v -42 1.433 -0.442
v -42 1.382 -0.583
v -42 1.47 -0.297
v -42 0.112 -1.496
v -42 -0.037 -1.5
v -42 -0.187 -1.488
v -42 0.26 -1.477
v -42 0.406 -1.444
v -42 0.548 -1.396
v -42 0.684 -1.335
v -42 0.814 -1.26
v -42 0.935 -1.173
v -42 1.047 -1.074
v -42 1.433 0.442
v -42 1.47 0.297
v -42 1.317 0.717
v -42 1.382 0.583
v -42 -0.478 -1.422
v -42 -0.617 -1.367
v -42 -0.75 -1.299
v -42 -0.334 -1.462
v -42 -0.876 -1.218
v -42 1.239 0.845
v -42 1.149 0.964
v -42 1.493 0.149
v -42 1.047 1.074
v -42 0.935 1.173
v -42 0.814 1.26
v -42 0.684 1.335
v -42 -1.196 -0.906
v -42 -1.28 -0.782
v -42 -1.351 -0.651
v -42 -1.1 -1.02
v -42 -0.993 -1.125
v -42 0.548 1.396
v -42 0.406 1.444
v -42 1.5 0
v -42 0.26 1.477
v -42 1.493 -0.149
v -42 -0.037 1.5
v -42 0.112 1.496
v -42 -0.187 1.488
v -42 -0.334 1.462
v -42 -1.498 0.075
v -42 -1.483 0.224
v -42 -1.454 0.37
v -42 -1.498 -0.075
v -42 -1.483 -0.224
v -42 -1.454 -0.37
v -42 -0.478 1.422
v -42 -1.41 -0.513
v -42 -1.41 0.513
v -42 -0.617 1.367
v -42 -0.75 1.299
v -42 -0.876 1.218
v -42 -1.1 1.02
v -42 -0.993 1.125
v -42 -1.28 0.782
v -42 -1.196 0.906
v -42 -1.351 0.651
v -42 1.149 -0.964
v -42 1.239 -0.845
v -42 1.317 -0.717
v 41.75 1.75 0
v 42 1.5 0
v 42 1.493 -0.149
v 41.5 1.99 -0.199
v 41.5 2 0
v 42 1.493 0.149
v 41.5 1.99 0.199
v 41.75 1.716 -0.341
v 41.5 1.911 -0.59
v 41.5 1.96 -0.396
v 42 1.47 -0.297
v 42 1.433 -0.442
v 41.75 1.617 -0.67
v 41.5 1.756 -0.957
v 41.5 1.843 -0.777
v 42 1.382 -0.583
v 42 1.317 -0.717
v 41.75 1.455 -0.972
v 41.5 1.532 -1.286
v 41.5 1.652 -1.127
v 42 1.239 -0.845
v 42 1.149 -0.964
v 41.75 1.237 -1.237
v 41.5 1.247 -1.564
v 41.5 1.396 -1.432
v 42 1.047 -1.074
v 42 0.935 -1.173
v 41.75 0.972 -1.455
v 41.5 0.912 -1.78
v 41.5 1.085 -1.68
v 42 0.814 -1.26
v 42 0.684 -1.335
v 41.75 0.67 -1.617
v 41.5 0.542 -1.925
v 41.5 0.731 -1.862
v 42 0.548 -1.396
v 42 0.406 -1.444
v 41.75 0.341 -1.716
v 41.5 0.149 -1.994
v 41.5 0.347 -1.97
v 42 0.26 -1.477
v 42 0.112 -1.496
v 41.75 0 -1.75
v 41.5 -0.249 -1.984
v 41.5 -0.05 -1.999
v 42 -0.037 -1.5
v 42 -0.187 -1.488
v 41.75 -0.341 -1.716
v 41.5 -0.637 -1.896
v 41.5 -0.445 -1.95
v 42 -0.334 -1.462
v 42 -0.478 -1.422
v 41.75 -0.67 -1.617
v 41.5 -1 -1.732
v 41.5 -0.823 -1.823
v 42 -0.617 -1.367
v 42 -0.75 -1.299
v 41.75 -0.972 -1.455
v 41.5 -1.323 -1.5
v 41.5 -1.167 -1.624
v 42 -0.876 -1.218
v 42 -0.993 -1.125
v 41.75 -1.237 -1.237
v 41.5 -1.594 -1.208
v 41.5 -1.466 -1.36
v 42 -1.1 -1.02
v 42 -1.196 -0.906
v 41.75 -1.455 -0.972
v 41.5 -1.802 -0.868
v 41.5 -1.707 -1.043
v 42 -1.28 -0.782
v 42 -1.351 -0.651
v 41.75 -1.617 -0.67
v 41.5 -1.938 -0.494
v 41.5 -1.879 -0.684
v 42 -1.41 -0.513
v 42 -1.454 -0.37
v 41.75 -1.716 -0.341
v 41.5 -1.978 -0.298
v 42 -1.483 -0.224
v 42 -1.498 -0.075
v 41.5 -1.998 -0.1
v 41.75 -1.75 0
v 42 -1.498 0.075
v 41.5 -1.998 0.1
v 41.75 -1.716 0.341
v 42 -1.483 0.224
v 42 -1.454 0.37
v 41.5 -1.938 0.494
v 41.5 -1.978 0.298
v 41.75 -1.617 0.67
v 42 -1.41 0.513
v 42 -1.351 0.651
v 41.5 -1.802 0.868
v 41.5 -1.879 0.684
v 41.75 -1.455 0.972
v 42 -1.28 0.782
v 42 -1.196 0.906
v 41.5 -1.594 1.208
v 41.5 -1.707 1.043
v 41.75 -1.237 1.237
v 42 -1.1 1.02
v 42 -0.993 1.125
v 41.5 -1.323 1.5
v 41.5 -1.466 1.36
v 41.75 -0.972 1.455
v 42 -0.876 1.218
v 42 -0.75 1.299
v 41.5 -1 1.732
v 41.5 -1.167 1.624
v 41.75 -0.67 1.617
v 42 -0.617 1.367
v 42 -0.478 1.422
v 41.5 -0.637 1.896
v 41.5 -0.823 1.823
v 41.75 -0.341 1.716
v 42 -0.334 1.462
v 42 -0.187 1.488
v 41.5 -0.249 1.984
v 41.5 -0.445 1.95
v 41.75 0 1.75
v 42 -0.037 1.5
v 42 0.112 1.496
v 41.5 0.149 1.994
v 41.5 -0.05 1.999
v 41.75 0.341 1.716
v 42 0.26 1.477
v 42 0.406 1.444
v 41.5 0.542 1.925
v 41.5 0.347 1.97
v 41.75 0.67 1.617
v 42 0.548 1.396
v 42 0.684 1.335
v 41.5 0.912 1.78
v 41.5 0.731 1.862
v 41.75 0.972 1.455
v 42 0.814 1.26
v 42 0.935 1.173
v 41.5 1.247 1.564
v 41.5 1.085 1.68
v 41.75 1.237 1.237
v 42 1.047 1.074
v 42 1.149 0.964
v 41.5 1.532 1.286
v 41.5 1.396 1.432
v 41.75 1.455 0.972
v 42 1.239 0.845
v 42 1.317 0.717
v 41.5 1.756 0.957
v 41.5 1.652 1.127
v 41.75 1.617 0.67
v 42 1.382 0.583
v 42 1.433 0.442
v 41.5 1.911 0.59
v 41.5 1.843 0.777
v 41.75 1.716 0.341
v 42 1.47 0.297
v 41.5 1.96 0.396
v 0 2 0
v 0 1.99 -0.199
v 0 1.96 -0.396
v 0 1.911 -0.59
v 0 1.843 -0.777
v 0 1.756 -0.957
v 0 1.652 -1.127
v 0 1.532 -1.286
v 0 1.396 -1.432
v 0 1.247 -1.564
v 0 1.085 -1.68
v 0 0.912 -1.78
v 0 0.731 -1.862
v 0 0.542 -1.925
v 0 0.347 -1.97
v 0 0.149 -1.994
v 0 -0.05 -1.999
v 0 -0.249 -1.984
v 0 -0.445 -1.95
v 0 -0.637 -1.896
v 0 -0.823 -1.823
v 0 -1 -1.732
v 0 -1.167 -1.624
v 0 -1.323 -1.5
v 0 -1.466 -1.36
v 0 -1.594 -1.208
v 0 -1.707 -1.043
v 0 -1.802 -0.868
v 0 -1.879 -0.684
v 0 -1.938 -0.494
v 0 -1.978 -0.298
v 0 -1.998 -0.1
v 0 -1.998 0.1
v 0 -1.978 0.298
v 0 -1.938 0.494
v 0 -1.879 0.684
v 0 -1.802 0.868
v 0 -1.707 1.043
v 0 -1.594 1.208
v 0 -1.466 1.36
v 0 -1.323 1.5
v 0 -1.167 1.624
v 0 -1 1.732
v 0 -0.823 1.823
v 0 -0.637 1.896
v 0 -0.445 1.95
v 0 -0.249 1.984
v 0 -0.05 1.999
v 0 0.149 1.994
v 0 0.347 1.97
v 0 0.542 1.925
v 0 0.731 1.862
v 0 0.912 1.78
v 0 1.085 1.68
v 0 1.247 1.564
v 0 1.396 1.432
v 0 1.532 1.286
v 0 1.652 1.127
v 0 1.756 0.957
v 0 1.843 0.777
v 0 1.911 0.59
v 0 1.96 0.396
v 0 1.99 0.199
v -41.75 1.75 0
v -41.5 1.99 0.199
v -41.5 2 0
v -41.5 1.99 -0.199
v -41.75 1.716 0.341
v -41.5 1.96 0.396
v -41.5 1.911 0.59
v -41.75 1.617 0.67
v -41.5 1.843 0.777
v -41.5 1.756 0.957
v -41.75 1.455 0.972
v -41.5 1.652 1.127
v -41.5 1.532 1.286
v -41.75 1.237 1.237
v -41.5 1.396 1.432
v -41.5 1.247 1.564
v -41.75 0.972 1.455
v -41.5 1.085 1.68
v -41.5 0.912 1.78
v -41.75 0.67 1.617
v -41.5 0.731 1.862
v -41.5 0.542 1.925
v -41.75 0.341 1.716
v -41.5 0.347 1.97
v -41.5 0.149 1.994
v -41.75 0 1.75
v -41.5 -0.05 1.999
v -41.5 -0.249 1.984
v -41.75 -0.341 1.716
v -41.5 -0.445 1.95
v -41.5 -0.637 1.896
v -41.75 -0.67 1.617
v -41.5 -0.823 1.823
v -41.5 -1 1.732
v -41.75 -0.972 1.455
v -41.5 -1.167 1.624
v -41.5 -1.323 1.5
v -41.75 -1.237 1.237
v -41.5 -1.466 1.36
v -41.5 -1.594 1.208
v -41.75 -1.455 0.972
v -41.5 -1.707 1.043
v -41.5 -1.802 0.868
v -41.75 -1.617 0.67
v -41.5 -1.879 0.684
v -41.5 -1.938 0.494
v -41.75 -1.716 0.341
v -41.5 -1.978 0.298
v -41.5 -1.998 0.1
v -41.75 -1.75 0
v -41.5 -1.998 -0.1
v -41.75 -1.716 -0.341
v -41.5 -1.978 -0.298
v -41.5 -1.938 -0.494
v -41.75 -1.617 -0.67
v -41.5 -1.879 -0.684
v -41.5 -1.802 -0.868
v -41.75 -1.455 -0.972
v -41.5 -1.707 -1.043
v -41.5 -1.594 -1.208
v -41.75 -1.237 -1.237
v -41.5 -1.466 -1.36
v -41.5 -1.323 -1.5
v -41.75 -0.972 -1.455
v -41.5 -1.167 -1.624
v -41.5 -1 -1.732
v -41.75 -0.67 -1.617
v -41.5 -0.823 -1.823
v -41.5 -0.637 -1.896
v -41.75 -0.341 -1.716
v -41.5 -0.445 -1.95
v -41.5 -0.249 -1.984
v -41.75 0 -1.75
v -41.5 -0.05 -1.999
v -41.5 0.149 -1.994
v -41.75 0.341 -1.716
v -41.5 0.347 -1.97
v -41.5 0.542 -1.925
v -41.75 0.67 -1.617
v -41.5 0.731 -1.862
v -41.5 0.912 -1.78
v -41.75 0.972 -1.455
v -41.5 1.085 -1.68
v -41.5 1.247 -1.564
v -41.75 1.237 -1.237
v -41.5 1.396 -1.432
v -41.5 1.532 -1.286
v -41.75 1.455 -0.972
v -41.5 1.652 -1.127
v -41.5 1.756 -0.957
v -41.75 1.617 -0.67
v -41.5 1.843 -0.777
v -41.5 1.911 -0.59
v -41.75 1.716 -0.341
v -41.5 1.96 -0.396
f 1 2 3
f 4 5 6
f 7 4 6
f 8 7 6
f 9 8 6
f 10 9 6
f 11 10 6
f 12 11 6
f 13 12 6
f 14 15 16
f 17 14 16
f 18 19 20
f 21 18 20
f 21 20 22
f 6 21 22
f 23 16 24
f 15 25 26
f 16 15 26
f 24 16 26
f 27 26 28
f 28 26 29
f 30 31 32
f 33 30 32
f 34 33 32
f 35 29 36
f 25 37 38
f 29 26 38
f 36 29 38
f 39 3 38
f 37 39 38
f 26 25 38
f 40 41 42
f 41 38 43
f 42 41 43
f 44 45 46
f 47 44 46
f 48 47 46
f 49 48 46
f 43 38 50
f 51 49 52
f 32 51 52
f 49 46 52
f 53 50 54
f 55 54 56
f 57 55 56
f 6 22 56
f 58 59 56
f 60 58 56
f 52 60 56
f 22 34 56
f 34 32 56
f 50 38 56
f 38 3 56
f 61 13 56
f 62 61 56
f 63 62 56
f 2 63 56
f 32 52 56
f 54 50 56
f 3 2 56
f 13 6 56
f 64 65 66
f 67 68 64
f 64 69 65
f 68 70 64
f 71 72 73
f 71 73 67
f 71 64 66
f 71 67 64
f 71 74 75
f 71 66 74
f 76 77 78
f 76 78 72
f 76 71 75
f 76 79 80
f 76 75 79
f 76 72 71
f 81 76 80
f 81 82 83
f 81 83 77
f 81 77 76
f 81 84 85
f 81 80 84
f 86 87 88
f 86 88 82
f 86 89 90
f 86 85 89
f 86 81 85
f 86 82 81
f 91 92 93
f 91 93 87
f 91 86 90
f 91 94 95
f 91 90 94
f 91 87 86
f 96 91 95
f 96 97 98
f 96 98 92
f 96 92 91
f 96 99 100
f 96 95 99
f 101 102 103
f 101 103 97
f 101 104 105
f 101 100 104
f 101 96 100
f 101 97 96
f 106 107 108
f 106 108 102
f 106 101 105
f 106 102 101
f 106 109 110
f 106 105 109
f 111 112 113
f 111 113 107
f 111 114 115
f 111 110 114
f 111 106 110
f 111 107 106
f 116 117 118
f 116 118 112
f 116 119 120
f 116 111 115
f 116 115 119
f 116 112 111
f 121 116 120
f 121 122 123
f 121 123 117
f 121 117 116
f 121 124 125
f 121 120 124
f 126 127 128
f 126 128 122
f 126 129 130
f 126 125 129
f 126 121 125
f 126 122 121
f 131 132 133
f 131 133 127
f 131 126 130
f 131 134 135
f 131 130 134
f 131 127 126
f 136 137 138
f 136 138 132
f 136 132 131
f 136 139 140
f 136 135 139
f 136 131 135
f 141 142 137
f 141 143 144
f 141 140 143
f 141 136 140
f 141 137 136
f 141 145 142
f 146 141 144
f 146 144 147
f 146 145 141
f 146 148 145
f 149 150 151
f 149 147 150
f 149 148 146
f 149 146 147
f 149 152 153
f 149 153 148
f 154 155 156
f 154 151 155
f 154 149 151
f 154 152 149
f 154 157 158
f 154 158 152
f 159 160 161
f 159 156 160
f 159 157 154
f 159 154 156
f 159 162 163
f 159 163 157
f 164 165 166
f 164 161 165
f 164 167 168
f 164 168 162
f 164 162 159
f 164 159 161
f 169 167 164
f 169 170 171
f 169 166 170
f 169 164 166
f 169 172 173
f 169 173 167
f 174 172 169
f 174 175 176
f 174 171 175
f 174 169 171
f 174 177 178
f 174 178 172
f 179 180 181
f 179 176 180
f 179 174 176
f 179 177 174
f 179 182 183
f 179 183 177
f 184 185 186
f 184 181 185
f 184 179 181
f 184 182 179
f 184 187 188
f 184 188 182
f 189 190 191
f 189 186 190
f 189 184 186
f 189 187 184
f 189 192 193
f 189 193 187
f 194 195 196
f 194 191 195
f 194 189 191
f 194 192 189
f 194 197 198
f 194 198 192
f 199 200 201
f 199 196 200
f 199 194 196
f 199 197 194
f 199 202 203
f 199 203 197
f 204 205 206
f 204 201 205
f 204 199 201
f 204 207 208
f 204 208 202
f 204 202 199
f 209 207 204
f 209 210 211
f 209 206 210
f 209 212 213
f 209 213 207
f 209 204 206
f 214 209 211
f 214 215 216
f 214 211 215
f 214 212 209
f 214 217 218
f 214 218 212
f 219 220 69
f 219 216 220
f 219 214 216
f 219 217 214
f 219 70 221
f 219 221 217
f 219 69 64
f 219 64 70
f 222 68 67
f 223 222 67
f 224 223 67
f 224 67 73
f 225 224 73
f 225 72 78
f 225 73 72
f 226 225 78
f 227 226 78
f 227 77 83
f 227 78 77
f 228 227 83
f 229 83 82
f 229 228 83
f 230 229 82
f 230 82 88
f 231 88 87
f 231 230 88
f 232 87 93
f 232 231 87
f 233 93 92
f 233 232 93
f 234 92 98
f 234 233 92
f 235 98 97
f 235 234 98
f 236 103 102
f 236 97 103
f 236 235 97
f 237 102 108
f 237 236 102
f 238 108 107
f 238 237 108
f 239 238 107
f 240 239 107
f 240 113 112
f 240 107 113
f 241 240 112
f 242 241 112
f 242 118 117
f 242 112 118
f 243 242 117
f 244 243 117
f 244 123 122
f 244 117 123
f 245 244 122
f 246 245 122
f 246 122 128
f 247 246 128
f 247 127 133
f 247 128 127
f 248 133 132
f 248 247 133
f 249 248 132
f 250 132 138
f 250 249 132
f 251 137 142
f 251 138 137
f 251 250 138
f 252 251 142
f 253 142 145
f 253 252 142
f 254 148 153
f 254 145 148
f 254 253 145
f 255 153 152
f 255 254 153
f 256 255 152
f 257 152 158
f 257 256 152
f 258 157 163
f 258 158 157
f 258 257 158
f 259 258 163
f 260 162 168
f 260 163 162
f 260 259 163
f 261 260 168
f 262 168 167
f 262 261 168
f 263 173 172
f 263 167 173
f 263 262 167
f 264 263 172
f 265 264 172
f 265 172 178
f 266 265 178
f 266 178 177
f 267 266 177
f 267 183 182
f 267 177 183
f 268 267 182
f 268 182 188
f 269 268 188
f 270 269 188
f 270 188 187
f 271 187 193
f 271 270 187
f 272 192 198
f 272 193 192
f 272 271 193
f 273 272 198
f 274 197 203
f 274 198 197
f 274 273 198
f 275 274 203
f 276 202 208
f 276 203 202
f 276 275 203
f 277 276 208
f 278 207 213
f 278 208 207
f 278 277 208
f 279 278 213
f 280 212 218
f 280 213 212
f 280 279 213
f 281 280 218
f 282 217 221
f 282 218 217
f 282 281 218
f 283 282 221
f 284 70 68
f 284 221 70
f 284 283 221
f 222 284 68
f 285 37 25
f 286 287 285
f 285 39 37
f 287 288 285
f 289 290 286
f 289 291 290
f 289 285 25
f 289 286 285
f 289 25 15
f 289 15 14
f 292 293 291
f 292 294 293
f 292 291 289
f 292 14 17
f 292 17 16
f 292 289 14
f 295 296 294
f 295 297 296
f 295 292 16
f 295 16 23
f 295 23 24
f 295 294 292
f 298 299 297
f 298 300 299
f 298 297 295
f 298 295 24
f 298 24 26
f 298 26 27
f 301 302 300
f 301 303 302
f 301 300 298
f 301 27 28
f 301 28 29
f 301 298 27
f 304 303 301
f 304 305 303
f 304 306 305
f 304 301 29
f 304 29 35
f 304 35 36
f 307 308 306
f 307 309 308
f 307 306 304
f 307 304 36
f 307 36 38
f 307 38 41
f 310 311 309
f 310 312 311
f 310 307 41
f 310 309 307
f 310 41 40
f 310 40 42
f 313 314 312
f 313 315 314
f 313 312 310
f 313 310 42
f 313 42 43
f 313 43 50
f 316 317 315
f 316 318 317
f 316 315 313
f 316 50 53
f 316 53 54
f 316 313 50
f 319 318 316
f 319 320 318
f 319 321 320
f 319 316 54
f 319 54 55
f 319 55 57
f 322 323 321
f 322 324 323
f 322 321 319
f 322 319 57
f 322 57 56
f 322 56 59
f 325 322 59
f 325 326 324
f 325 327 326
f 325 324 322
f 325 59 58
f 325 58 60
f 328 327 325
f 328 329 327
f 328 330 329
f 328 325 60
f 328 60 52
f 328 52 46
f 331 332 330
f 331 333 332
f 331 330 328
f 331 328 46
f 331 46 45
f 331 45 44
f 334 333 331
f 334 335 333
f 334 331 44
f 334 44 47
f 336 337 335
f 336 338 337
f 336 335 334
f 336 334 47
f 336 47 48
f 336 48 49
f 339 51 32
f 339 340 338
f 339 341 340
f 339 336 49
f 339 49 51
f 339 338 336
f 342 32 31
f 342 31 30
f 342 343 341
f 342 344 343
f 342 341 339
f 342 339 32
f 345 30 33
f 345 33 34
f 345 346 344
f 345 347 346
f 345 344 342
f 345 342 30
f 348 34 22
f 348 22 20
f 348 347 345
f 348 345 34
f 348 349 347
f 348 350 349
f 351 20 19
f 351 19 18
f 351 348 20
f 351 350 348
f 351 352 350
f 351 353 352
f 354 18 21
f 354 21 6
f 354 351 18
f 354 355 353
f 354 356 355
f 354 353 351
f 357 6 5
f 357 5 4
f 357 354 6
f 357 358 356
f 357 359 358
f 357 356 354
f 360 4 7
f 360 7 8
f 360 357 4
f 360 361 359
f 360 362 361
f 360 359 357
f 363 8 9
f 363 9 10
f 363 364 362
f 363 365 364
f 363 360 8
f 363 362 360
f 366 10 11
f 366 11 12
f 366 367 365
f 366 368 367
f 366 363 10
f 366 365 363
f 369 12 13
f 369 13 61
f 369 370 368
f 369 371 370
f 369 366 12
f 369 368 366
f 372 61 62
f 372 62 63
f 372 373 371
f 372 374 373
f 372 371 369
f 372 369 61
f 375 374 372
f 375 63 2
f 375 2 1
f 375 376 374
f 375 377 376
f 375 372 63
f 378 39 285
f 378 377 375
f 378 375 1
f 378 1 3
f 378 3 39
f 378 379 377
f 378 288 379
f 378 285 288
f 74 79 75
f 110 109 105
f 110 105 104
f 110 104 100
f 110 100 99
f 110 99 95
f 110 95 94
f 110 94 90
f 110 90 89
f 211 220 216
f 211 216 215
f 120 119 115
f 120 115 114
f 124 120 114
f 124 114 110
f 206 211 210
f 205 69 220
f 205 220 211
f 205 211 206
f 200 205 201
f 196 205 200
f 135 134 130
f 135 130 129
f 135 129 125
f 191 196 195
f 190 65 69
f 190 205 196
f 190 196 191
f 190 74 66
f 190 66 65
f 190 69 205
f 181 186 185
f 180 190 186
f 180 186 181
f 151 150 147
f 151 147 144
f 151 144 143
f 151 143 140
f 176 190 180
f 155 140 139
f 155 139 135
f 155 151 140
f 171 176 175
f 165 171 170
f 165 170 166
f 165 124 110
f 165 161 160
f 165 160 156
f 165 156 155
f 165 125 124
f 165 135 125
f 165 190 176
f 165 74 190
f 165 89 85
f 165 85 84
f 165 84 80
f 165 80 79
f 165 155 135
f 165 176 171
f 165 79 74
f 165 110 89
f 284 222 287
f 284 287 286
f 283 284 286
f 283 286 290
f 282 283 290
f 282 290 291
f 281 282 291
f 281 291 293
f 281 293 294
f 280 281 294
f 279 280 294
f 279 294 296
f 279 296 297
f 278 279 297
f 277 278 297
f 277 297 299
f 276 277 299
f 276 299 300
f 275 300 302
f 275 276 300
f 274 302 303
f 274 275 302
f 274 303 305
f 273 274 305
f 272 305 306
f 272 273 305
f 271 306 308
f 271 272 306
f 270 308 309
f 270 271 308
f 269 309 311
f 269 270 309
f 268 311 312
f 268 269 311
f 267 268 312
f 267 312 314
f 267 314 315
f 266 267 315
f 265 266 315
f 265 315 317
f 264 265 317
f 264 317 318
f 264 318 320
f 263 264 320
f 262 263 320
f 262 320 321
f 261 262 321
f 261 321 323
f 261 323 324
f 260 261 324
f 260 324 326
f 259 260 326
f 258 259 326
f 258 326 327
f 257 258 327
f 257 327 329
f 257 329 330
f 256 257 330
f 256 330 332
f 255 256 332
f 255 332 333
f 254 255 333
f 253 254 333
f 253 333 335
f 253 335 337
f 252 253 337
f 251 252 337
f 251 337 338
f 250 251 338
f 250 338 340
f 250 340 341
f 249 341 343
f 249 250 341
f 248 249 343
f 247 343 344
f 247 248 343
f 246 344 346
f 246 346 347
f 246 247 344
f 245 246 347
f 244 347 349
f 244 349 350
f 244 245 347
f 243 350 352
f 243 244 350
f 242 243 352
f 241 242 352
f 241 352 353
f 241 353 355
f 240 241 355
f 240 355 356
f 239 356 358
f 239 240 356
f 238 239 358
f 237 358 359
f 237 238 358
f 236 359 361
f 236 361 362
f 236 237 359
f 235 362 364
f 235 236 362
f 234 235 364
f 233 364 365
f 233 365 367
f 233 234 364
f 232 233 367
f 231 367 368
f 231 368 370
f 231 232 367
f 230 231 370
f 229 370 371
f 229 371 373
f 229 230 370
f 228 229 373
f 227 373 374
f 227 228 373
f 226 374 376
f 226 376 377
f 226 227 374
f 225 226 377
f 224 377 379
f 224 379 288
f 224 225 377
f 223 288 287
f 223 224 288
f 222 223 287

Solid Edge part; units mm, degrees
sketch "Sketch1" plane through (0, 0, 0) normal (1, 0, 0) x (0, 1, 0)
  circle A0 centre (0, 0) radius 2
extrude "Protrusion1" add sketch "Sketch1" along normal mid plane 84
cosmetic_thread "Thread_1" size "M4" thread depth 8
cosmetic_thread "Thread_2" size "M4" thread depth 8
chamfer "Chamfer_1" distance 0.5 angle 45 1 edges at (-42, -2, 0) measured on face at (-42, 1.2933, -1.3733)
chamfer "Chamfer_2" distance 0.5 angle 45 1 edges at (42, -2, 0) measured on face at (42, 1.2933, -1.3733)
